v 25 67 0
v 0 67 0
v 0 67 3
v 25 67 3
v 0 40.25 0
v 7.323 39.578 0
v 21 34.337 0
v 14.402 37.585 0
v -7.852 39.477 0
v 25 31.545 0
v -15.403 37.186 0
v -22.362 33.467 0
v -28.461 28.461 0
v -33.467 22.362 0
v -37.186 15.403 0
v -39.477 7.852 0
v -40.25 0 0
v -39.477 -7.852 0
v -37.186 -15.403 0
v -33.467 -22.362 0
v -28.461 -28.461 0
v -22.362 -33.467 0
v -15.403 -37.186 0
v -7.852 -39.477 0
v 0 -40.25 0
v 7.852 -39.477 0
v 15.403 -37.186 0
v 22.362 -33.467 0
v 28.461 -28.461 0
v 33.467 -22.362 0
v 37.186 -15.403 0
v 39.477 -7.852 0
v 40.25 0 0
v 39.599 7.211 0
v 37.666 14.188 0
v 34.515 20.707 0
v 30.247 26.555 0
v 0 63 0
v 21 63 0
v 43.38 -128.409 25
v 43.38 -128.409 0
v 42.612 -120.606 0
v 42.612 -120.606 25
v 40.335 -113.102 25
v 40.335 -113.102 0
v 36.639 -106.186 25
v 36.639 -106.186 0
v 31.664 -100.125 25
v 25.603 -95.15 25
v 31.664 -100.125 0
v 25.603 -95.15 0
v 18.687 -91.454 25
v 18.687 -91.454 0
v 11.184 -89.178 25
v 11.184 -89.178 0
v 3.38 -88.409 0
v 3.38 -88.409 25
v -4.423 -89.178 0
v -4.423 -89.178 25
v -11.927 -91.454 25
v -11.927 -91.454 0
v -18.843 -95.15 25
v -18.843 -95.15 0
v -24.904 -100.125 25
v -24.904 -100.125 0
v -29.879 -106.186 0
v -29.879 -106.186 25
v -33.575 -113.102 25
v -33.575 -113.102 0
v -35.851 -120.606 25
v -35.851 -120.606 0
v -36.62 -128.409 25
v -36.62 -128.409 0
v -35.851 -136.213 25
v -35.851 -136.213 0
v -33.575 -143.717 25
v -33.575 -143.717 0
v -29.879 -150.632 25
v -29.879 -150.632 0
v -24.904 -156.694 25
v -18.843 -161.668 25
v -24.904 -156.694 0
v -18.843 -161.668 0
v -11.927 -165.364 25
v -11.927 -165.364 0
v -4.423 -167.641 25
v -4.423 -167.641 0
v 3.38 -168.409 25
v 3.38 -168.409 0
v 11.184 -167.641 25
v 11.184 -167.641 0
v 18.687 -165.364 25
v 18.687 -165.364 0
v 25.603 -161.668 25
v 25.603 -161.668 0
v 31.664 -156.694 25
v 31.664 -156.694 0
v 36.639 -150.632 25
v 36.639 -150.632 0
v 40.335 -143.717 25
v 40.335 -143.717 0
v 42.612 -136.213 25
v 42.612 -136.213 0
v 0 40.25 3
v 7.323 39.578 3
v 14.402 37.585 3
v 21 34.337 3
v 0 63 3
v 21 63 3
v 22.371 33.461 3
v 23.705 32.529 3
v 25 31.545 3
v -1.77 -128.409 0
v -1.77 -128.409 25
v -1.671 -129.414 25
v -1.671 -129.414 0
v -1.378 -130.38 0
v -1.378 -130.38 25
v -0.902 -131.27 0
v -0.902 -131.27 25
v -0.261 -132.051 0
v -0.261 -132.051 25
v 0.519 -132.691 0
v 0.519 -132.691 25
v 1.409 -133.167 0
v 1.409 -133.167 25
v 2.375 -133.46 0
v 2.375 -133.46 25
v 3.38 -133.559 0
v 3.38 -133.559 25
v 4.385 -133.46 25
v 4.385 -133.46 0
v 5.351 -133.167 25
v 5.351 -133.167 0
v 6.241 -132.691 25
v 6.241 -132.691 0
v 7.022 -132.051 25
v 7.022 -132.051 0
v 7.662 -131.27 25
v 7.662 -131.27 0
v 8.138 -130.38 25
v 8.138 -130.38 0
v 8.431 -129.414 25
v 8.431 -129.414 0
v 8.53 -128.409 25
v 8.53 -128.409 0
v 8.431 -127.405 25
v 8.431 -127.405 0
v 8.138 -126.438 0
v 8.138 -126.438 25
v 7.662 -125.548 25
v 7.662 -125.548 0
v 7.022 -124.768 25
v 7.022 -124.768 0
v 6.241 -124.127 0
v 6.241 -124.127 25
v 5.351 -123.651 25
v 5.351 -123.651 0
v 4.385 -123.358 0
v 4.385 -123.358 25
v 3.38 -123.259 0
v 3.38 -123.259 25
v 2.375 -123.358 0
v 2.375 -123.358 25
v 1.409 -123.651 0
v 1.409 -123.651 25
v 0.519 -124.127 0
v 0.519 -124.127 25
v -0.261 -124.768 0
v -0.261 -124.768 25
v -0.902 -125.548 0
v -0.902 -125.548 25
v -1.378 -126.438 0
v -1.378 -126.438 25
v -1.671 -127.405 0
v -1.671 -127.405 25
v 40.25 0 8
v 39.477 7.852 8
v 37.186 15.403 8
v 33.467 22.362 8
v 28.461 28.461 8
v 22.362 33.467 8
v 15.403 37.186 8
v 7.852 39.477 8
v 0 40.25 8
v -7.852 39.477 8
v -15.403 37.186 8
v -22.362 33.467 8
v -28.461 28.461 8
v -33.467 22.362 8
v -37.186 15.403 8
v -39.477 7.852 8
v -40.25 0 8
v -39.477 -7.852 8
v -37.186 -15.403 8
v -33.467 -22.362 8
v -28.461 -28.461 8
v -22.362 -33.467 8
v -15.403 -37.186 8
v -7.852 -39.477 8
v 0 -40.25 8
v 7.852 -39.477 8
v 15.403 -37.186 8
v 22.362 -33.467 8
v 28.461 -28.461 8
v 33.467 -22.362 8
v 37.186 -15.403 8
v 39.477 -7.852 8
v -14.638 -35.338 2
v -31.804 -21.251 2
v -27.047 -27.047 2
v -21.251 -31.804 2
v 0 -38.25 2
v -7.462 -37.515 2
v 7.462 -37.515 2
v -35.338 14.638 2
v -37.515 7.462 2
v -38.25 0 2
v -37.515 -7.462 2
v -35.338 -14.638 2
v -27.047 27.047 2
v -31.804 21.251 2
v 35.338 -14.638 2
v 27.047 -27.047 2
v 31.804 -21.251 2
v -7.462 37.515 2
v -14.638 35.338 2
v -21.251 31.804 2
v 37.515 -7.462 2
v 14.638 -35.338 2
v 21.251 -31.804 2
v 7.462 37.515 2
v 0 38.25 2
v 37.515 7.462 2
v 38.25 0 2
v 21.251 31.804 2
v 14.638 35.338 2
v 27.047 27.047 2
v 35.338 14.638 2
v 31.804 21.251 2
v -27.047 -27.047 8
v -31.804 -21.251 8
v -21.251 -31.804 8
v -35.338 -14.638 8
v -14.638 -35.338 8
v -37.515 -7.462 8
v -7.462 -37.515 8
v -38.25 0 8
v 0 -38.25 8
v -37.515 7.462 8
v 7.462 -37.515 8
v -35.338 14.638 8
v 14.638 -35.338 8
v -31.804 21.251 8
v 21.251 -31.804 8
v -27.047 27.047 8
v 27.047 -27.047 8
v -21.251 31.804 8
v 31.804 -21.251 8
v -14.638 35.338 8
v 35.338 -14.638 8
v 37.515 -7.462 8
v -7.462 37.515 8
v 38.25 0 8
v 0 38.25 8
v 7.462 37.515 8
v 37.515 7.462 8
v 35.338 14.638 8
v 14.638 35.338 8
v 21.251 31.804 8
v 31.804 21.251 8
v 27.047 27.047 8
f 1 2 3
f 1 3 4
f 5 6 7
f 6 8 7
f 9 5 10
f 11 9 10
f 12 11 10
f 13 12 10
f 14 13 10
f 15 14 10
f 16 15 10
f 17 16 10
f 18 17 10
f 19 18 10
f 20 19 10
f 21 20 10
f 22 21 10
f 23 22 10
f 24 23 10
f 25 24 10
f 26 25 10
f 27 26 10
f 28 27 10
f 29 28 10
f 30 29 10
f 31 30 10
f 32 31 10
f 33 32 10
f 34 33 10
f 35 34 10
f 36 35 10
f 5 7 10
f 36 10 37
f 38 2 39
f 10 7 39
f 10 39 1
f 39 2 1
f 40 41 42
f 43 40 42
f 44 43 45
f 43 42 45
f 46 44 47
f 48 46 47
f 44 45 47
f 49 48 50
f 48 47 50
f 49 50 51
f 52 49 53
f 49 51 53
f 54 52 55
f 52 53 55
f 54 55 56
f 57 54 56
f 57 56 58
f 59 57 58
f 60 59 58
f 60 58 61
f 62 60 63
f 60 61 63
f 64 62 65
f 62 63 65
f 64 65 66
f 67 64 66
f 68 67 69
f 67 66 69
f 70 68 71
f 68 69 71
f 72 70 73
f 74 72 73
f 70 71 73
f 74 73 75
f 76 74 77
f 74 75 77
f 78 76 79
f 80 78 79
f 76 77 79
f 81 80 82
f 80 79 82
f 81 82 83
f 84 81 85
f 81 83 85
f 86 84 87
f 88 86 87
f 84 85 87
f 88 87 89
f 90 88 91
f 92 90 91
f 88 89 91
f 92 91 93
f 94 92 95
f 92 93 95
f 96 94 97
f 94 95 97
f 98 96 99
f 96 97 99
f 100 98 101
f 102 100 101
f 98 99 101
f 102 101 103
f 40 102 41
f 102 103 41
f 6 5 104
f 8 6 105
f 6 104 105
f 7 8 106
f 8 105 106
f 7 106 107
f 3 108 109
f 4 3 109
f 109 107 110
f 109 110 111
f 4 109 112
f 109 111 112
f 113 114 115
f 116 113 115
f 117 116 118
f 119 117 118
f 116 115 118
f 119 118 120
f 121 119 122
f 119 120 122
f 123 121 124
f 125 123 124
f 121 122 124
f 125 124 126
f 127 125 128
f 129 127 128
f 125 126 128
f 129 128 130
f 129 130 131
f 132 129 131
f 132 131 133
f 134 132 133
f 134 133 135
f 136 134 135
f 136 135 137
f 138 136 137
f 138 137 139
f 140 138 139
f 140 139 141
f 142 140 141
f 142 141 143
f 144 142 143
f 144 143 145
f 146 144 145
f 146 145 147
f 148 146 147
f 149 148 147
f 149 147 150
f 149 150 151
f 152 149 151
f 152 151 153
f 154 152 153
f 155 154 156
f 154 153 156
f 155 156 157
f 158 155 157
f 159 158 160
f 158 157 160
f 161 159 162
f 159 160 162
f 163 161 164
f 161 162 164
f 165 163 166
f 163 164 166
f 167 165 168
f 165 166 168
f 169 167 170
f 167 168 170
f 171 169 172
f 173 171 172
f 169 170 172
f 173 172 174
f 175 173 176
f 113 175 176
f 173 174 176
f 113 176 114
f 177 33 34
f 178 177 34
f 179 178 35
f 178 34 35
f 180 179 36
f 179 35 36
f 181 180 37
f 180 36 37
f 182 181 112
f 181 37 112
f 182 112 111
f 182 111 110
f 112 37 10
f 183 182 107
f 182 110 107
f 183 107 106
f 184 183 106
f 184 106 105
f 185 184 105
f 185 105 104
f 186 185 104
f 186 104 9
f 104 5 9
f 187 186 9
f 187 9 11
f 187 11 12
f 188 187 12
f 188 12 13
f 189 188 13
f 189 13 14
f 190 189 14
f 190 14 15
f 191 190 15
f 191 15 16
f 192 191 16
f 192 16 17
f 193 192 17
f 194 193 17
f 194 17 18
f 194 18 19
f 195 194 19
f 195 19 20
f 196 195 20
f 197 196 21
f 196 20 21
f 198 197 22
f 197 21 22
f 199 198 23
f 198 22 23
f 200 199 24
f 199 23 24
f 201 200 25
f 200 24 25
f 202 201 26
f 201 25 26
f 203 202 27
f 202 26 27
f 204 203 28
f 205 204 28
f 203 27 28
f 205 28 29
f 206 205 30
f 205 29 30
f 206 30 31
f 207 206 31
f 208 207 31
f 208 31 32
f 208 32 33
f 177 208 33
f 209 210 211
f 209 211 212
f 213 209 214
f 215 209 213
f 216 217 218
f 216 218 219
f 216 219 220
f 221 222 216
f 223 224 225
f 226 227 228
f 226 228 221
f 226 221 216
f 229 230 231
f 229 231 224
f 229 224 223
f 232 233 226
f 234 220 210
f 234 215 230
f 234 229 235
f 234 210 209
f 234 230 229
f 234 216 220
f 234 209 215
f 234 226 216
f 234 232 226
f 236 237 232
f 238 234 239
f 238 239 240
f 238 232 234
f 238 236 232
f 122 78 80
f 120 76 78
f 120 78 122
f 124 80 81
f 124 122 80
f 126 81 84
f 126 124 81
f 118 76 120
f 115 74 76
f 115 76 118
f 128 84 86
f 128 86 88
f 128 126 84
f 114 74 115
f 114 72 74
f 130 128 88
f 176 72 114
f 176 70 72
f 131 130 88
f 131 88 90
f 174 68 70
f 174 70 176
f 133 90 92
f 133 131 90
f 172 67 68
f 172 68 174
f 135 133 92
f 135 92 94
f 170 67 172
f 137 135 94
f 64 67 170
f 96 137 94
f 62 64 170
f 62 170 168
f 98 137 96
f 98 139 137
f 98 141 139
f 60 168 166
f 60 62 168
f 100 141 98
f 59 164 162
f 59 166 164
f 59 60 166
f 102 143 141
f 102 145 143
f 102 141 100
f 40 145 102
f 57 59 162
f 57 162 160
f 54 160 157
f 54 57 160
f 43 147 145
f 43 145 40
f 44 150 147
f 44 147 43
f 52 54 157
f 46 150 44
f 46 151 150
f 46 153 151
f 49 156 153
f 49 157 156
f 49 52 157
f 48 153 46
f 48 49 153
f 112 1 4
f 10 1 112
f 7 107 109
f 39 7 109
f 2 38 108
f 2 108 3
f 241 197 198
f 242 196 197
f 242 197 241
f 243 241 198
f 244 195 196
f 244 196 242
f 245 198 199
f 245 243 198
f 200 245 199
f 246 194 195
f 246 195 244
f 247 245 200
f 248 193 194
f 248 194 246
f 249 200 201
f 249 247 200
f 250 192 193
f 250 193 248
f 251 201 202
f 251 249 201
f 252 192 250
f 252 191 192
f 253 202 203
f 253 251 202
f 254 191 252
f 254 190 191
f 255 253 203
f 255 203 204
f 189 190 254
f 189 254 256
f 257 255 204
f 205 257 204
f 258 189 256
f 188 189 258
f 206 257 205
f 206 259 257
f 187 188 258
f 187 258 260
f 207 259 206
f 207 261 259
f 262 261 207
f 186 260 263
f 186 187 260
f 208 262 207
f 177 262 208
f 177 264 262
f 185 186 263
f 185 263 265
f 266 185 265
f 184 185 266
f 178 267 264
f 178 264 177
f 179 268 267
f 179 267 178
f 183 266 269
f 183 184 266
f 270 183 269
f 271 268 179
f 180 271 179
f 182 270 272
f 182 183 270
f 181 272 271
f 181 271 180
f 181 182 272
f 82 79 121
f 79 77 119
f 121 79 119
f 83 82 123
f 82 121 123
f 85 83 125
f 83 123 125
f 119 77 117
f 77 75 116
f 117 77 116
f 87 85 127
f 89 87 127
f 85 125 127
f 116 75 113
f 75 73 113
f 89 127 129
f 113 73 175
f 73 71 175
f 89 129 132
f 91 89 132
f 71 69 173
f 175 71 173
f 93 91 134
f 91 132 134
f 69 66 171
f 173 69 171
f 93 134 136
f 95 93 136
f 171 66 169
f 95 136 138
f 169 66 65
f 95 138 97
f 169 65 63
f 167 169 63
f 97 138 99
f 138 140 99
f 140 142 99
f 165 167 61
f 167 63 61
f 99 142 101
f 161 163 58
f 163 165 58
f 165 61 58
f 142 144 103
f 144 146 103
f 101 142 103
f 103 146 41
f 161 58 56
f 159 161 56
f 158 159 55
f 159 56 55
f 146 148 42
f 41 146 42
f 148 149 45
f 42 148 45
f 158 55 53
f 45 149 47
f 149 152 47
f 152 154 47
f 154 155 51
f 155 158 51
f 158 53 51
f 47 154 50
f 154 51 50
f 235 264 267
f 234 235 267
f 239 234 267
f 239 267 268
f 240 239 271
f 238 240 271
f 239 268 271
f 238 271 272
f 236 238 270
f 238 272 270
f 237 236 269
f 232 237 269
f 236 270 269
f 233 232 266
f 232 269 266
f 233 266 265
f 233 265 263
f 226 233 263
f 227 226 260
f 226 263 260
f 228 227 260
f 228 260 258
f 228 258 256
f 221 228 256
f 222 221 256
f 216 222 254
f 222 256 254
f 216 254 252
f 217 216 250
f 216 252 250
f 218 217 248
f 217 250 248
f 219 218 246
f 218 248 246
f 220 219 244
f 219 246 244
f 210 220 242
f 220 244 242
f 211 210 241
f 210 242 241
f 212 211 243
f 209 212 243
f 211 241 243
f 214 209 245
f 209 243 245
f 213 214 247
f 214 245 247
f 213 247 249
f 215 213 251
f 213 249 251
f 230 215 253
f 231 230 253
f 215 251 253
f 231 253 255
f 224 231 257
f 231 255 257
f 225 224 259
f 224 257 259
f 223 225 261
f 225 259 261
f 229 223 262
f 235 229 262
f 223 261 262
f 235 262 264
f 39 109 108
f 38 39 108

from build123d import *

# Parameters (mm, degrees)
F0_R     = 40.25
F1_DEPTH = 8
F2_R     = 38.25
F3_DEPTH = 6
F5_DEPTH = 3
F7_DEPTH = 3
F8_R     = 40
F9_DEPTH = 25
F10_D    = 10.3


with BuildPart() as f1:
    # F0 (on Top) → F1 (new body)
    with BuildSketch(Plane.XY):
        Circle(F0_R)
    extrude(amount=F1_DEPTH)

    # F2 (on face) → F3 (cut)
    with BuildSketch(Plane.XY.offset(8)):
        Circle(F2_R)
    extrude(amount=-F3_DEPTH, mode=Mode.SUBTRACT)

    # F4 (on face) → F5 (join)
    with BuildSketch(Plane(origin=(0, 0, 0), x_dir=(1, 0, 0), z_dir=(0, 0, -1))):
        with BuildLine():
            ThreePointArc((25, -31.5446112672), (13.2361606309, -38.0114002867), (0, -40.25))
            Line((0, -40.25), (0, -67))
            Line((0, -67), (25, -67))
            Line((25, -67), (25, -31.5446112672))
        make_face()
    extrude(amount=-F5_DEPTH)

    # F6 (on face) → F7 (cut, through all)
    with BuildSketch(Plane.XY.offset(3)):
        with BuildLine():
            Line((21, 63), (0, 63))
            Line((0, 63), (0, 40.25))
            ThreePointArc((0, 40.25), (10.9082296729, 38.743683684), (21, 34.3374795231))
            Line((21, 34.3374795231), (21, 63))
        make_face()
    extrude(amount=-F7_DEPTH, mode=Mode.SUBTRACT)


with BuildPart() as f9:
    # F8 (on Top) → F9 (new body)
    with BuildSketch(Plane.XY):
        with Locations((3.3801544923, -128.4092366695)):
            Circle(F8_R)
    extrude(amount=F9_DEPTH)

    # F10 (through all)
    with Locations(Plane(origin=(0, 0, 0), x_dir=(1, 0, 0), z_dir=(0, 0, -1))):
        with Locations((3.3801544923, 128.4092366695)):
            Hole(F10_D / 2)


solid = Compound([f1.part, f9.part])
